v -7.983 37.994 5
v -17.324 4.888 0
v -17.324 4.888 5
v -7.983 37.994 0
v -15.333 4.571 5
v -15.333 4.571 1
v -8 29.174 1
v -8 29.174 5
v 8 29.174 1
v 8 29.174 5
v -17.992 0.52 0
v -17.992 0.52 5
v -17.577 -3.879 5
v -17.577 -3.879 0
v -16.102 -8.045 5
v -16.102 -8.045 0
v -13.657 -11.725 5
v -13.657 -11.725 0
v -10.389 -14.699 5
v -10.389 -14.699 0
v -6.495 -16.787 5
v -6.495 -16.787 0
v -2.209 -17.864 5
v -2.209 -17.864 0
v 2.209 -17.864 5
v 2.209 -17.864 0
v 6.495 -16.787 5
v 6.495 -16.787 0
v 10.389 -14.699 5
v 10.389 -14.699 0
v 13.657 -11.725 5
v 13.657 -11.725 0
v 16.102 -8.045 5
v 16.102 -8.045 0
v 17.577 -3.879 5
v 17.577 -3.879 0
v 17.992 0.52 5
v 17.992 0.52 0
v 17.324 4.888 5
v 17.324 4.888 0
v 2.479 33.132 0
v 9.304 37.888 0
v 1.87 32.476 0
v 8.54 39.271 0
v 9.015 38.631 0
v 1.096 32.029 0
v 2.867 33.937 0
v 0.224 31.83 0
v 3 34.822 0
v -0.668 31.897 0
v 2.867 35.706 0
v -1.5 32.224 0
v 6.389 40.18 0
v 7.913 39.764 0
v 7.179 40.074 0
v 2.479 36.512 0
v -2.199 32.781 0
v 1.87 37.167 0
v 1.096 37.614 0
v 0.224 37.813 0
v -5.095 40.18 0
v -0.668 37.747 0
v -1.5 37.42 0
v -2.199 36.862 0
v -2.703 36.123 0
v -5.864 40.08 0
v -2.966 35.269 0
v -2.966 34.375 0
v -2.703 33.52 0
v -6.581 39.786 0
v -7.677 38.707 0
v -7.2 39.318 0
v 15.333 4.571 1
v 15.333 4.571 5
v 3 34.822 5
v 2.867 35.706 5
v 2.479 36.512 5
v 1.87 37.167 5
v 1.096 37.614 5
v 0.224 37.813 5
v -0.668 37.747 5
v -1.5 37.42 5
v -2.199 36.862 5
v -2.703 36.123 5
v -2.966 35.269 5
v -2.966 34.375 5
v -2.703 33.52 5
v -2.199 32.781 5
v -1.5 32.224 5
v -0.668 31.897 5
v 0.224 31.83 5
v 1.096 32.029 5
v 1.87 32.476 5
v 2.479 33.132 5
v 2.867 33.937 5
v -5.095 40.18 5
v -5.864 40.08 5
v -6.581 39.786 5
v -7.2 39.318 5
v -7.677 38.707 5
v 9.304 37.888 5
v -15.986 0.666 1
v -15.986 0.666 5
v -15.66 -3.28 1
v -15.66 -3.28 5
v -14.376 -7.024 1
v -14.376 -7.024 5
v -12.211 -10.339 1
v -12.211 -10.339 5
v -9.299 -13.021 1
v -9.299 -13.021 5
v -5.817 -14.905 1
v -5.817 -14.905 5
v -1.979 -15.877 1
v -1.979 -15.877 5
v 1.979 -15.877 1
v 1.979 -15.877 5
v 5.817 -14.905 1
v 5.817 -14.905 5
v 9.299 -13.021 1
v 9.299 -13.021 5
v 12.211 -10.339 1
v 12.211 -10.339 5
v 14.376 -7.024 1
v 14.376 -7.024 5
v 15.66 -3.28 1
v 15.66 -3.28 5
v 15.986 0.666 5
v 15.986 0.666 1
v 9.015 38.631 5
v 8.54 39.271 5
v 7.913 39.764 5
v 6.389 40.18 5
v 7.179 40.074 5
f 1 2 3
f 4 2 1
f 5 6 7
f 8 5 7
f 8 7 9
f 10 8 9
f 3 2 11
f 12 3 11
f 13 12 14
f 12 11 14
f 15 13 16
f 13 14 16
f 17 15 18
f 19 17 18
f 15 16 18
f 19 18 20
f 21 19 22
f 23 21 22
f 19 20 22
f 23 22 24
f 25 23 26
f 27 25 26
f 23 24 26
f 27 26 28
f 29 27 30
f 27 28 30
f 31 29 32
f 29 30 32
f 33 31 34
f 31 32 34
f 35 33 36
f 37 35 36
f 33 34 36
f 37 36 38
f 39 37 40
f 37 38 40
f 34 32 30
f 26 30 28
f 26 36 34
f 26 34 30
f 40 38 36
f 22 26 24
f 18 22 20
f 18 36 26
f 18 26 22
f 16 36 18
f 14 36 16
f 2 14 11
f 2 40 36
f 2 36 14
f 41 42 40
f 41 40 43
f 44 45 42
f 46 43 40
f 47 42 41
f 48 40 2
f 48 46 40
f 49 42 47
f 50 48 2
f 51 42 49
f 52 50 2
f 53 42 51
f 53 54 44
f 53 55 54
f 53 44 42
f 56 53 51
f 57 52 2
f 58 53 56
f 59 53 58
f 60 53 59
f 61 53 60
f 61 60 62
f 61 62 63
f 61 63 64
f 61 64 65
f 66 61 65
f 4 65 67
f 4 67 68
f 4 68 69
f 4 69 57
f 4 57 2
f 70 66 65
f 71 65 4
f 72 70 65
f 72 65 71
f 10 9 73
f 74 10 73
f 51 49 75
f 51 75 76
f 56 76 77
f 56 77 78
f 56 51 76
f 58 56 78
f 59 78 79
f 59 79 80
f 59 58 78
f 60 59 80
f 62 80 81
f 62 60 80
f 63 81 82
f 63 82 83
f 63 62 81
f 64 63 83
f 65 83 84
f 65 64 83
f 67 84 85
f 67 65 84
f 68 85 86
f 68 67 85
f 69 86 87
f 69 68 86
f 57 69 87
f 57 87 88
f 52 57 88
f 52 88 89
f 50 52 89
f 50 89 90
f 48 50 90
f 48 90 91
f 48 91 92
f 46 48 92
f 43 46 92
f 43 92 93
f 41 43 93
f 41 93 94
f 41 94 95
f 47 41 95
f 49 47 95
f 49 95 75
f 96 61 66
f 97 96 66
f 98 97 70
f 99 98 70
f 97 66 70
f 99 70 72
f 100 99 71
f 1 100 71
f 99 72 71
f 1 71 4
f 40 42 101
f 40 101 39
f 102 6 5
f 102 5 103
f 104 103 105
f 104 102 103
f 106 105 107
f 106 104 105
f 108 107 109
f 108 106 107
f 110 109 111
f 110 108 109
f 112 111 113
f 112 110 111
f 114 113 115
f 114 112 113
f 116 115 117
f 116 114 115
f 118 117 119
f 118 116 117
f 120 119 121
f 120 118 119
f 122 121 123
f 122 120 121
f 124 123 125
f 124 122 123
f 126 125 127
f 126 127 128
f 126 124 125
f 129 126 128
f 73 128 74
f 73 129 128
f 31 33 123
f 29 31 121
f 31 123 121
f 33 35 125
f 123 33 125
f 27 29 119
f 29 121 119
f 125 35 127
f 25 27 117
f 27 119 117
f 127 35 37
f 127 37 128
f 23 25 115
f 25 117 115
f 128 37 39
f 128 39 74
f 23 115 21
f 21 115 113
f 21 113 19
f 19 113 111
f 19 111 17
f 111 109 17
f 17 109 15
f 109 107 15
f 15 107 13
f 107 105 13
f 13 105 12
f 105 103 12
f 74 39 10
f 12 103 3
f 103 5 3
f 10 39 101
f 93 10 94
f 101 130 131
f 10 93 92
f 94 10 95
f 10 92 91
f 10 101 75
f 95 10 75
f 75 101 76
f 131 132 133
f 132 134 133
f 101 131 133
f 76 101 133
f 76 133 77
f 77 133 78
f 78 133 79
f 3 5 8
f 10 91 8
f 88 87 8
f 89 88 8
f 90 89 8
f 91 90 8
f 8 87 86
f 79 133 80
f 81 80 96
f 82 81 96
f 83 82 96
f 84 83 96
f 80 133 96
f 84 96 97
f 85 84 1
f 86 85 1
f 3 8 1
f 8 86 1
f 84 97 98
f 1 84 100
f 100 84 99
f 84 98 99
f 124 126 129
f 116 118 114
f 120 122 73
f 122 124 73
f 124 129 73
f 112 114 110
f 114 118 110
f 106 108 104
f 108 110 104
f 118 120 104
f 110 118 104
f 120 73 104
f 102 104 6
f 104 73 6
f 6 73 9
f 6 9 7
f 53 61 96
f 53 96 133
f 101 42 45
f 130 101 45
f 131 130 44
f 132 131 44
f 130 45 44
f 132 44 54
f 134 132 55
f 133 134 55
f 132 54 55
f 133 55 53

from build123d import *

# Parameters (mm, degrees)
SKETCH003_R  = 3
PAD001_DEPTH = 1
SKETCH_R     = 3
PAD_DEPTH    = 4


with BuildPart() as bottom_body:
    # Sketch003 → Pad001 (new body)
    with BuildSketch(Plane.XY):
        with BuildLine():
            Line((-17.323639, 4.887895), (-7.982505, 37.994419))
            ThreePointArc((-5.095233, 40.179764), (-6.905763, 39.571831), (-7.982505, 37.994419))
            Line((-5.095233, 40.179764), (6.389044, 40.179764))
            ThreePointArc((9.304202, 37.88818), (8.24306, 39.538286), (6.389044, 40.179764))
            Line((9.304202, 37.88818), (17.323639, 4.887895))
            ThreePointArc((-17.323639, 4.887895), (0, -18), (17.323639, 4.887895))
        make_face()
        with Locations((0, 34.821754)):
            Circle(SKETCH003_R, mode=Mode.SUBTRACT)
    extrude(amount=PAD001_DEPTH)


with BuildPart() as fusion:
    # Sketch → Pad (new body)
    with BuildSketch(Plane.XY):
        with BuildLine():
            Line((-17.323639, 4.887895), (-7.982505, 37.994419))
            ThreePointArc((-5.095233, 40.179764), (-6.905763, 39.571831), (-7.982505, 37.994419))
            Line((-5.095233, 40.179764), (6.389044, 40.179764))
            ThreePointArc((9.304202, 37.88818), (8.24306, 39.538286), (6.389044, 40.179764))
            Line((9.304202, 37.88818), (17.323639, 4.887895))
            ThreePointArc((-17.323639, 4.887895), (0, -18), (17.323639, 4.887895))
        make_face()
        with Locations((0, 34.821754)):
            Circle(SKETCH_R, mode=Mode.SUBTRACT)
        with BuildLine():
            Line((-15.333297, 4.57056), (-8, 29.174304))
            Line((-8, 29.174304), (8, 29.174304))
            Line((8, 29.174304), (15.333297, 4.57056))
            ThreePointArc((-15.333297, 4.57056), (0, -16), (15.333297, 4.57056))
        make_face(mode=Mode.SUBTRACT)
    extrude(amount=PAD_DEPTH)


with BuildPart() as fusion_1:
    # Body placement: moved
    add(fusion.part.moved(Location((0, 0, 1))))

    # Fusion: union bottom body
    add(bottom_body.part)


solid = fusion_1.part
